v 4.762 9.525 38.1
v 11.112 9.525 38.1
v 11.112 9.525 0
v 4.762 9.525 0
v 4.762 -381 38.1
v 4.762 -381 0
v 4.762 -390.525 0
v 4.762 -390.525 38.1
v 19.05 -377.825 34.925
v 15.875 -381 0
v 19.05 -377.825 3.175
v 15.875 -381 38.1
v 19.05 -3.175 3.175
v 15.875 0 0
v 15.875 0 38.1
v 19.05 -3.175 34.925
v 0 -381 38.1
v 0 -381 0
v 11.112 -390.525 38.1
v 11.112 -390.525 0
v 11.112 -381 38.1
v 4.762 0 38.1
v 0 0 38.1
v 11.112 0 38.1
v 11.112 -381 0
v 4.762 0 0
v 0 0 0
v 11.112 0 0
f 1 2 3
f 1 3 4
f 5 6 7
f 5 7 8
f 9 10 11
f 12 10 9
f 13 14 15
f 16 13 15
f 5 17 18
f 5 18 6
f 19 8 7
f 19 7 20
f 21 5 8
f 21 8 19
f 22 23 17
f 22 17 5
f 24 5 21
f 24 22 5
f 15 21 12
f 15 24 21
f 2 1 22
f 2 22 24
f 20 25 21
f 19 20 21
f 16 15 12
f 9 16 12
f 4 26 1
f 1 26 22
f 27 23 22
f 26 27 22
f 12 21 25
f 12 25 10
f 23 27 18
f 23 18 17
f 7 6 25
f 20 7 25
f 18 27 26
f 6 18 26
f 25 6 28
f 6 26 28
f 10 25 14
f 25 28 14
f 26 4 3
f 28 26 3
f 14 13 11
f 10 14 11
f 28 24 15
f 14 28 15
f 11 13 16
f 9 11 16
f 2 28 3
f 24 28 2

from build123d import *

# Parameters (mm, degrees)
F0_W     = 19.05
F0_H     = 38.1
F1_DEPTH = 381
F2_SIZE  = 3.175
F3_W     = 6.35
F3_H     = 38.1
F4_DEPTH = 9.525
F5_W     = 6.35
F5_H     = 38.1
F6_DEPTH = 9.525


with BuildPart() as f1:
    # F0 (on Front) → F1 (new body)
    with BuildSketch(Plane.XZ):
        with Locations((9.525, 19.05)):
            Rectangle(F0_W, F0_H)
    extrude(amount=F1_DEPTH)

    # F2
    f2_edges = [f1.edges().sort_by_distance(p)[0] for p in [
        (19.05, -190.5, 38.1),
        (19.05, -381, 19.05),
        (19.05, 0, 19.05),
        (19.05, -190.5, 0),
    ]]
    chamfer(f2_edges, length=F2_SIZE)

    # F3 (on face) → F4 (join)
    with BuildSketch(Plane.XZ.offset(381)):
        with Locations((7.9375, 19.05)):
            Rectangle(F3_W, F3_H)
    extrude(amount=F4_DEPTH)

    # F5 (on face) → F6 (join)
    with BuildSketch(Plane(origin=(0, 0, 0), x_dir=(-1, 0, 0), z_dir=(0, 1, 0))):
        with Locations((-7.9375, 19.05)):
            Rectangle(F5_W, F5_H)
    extrude(amount=F6_DEPTH)


solid = f1.part
